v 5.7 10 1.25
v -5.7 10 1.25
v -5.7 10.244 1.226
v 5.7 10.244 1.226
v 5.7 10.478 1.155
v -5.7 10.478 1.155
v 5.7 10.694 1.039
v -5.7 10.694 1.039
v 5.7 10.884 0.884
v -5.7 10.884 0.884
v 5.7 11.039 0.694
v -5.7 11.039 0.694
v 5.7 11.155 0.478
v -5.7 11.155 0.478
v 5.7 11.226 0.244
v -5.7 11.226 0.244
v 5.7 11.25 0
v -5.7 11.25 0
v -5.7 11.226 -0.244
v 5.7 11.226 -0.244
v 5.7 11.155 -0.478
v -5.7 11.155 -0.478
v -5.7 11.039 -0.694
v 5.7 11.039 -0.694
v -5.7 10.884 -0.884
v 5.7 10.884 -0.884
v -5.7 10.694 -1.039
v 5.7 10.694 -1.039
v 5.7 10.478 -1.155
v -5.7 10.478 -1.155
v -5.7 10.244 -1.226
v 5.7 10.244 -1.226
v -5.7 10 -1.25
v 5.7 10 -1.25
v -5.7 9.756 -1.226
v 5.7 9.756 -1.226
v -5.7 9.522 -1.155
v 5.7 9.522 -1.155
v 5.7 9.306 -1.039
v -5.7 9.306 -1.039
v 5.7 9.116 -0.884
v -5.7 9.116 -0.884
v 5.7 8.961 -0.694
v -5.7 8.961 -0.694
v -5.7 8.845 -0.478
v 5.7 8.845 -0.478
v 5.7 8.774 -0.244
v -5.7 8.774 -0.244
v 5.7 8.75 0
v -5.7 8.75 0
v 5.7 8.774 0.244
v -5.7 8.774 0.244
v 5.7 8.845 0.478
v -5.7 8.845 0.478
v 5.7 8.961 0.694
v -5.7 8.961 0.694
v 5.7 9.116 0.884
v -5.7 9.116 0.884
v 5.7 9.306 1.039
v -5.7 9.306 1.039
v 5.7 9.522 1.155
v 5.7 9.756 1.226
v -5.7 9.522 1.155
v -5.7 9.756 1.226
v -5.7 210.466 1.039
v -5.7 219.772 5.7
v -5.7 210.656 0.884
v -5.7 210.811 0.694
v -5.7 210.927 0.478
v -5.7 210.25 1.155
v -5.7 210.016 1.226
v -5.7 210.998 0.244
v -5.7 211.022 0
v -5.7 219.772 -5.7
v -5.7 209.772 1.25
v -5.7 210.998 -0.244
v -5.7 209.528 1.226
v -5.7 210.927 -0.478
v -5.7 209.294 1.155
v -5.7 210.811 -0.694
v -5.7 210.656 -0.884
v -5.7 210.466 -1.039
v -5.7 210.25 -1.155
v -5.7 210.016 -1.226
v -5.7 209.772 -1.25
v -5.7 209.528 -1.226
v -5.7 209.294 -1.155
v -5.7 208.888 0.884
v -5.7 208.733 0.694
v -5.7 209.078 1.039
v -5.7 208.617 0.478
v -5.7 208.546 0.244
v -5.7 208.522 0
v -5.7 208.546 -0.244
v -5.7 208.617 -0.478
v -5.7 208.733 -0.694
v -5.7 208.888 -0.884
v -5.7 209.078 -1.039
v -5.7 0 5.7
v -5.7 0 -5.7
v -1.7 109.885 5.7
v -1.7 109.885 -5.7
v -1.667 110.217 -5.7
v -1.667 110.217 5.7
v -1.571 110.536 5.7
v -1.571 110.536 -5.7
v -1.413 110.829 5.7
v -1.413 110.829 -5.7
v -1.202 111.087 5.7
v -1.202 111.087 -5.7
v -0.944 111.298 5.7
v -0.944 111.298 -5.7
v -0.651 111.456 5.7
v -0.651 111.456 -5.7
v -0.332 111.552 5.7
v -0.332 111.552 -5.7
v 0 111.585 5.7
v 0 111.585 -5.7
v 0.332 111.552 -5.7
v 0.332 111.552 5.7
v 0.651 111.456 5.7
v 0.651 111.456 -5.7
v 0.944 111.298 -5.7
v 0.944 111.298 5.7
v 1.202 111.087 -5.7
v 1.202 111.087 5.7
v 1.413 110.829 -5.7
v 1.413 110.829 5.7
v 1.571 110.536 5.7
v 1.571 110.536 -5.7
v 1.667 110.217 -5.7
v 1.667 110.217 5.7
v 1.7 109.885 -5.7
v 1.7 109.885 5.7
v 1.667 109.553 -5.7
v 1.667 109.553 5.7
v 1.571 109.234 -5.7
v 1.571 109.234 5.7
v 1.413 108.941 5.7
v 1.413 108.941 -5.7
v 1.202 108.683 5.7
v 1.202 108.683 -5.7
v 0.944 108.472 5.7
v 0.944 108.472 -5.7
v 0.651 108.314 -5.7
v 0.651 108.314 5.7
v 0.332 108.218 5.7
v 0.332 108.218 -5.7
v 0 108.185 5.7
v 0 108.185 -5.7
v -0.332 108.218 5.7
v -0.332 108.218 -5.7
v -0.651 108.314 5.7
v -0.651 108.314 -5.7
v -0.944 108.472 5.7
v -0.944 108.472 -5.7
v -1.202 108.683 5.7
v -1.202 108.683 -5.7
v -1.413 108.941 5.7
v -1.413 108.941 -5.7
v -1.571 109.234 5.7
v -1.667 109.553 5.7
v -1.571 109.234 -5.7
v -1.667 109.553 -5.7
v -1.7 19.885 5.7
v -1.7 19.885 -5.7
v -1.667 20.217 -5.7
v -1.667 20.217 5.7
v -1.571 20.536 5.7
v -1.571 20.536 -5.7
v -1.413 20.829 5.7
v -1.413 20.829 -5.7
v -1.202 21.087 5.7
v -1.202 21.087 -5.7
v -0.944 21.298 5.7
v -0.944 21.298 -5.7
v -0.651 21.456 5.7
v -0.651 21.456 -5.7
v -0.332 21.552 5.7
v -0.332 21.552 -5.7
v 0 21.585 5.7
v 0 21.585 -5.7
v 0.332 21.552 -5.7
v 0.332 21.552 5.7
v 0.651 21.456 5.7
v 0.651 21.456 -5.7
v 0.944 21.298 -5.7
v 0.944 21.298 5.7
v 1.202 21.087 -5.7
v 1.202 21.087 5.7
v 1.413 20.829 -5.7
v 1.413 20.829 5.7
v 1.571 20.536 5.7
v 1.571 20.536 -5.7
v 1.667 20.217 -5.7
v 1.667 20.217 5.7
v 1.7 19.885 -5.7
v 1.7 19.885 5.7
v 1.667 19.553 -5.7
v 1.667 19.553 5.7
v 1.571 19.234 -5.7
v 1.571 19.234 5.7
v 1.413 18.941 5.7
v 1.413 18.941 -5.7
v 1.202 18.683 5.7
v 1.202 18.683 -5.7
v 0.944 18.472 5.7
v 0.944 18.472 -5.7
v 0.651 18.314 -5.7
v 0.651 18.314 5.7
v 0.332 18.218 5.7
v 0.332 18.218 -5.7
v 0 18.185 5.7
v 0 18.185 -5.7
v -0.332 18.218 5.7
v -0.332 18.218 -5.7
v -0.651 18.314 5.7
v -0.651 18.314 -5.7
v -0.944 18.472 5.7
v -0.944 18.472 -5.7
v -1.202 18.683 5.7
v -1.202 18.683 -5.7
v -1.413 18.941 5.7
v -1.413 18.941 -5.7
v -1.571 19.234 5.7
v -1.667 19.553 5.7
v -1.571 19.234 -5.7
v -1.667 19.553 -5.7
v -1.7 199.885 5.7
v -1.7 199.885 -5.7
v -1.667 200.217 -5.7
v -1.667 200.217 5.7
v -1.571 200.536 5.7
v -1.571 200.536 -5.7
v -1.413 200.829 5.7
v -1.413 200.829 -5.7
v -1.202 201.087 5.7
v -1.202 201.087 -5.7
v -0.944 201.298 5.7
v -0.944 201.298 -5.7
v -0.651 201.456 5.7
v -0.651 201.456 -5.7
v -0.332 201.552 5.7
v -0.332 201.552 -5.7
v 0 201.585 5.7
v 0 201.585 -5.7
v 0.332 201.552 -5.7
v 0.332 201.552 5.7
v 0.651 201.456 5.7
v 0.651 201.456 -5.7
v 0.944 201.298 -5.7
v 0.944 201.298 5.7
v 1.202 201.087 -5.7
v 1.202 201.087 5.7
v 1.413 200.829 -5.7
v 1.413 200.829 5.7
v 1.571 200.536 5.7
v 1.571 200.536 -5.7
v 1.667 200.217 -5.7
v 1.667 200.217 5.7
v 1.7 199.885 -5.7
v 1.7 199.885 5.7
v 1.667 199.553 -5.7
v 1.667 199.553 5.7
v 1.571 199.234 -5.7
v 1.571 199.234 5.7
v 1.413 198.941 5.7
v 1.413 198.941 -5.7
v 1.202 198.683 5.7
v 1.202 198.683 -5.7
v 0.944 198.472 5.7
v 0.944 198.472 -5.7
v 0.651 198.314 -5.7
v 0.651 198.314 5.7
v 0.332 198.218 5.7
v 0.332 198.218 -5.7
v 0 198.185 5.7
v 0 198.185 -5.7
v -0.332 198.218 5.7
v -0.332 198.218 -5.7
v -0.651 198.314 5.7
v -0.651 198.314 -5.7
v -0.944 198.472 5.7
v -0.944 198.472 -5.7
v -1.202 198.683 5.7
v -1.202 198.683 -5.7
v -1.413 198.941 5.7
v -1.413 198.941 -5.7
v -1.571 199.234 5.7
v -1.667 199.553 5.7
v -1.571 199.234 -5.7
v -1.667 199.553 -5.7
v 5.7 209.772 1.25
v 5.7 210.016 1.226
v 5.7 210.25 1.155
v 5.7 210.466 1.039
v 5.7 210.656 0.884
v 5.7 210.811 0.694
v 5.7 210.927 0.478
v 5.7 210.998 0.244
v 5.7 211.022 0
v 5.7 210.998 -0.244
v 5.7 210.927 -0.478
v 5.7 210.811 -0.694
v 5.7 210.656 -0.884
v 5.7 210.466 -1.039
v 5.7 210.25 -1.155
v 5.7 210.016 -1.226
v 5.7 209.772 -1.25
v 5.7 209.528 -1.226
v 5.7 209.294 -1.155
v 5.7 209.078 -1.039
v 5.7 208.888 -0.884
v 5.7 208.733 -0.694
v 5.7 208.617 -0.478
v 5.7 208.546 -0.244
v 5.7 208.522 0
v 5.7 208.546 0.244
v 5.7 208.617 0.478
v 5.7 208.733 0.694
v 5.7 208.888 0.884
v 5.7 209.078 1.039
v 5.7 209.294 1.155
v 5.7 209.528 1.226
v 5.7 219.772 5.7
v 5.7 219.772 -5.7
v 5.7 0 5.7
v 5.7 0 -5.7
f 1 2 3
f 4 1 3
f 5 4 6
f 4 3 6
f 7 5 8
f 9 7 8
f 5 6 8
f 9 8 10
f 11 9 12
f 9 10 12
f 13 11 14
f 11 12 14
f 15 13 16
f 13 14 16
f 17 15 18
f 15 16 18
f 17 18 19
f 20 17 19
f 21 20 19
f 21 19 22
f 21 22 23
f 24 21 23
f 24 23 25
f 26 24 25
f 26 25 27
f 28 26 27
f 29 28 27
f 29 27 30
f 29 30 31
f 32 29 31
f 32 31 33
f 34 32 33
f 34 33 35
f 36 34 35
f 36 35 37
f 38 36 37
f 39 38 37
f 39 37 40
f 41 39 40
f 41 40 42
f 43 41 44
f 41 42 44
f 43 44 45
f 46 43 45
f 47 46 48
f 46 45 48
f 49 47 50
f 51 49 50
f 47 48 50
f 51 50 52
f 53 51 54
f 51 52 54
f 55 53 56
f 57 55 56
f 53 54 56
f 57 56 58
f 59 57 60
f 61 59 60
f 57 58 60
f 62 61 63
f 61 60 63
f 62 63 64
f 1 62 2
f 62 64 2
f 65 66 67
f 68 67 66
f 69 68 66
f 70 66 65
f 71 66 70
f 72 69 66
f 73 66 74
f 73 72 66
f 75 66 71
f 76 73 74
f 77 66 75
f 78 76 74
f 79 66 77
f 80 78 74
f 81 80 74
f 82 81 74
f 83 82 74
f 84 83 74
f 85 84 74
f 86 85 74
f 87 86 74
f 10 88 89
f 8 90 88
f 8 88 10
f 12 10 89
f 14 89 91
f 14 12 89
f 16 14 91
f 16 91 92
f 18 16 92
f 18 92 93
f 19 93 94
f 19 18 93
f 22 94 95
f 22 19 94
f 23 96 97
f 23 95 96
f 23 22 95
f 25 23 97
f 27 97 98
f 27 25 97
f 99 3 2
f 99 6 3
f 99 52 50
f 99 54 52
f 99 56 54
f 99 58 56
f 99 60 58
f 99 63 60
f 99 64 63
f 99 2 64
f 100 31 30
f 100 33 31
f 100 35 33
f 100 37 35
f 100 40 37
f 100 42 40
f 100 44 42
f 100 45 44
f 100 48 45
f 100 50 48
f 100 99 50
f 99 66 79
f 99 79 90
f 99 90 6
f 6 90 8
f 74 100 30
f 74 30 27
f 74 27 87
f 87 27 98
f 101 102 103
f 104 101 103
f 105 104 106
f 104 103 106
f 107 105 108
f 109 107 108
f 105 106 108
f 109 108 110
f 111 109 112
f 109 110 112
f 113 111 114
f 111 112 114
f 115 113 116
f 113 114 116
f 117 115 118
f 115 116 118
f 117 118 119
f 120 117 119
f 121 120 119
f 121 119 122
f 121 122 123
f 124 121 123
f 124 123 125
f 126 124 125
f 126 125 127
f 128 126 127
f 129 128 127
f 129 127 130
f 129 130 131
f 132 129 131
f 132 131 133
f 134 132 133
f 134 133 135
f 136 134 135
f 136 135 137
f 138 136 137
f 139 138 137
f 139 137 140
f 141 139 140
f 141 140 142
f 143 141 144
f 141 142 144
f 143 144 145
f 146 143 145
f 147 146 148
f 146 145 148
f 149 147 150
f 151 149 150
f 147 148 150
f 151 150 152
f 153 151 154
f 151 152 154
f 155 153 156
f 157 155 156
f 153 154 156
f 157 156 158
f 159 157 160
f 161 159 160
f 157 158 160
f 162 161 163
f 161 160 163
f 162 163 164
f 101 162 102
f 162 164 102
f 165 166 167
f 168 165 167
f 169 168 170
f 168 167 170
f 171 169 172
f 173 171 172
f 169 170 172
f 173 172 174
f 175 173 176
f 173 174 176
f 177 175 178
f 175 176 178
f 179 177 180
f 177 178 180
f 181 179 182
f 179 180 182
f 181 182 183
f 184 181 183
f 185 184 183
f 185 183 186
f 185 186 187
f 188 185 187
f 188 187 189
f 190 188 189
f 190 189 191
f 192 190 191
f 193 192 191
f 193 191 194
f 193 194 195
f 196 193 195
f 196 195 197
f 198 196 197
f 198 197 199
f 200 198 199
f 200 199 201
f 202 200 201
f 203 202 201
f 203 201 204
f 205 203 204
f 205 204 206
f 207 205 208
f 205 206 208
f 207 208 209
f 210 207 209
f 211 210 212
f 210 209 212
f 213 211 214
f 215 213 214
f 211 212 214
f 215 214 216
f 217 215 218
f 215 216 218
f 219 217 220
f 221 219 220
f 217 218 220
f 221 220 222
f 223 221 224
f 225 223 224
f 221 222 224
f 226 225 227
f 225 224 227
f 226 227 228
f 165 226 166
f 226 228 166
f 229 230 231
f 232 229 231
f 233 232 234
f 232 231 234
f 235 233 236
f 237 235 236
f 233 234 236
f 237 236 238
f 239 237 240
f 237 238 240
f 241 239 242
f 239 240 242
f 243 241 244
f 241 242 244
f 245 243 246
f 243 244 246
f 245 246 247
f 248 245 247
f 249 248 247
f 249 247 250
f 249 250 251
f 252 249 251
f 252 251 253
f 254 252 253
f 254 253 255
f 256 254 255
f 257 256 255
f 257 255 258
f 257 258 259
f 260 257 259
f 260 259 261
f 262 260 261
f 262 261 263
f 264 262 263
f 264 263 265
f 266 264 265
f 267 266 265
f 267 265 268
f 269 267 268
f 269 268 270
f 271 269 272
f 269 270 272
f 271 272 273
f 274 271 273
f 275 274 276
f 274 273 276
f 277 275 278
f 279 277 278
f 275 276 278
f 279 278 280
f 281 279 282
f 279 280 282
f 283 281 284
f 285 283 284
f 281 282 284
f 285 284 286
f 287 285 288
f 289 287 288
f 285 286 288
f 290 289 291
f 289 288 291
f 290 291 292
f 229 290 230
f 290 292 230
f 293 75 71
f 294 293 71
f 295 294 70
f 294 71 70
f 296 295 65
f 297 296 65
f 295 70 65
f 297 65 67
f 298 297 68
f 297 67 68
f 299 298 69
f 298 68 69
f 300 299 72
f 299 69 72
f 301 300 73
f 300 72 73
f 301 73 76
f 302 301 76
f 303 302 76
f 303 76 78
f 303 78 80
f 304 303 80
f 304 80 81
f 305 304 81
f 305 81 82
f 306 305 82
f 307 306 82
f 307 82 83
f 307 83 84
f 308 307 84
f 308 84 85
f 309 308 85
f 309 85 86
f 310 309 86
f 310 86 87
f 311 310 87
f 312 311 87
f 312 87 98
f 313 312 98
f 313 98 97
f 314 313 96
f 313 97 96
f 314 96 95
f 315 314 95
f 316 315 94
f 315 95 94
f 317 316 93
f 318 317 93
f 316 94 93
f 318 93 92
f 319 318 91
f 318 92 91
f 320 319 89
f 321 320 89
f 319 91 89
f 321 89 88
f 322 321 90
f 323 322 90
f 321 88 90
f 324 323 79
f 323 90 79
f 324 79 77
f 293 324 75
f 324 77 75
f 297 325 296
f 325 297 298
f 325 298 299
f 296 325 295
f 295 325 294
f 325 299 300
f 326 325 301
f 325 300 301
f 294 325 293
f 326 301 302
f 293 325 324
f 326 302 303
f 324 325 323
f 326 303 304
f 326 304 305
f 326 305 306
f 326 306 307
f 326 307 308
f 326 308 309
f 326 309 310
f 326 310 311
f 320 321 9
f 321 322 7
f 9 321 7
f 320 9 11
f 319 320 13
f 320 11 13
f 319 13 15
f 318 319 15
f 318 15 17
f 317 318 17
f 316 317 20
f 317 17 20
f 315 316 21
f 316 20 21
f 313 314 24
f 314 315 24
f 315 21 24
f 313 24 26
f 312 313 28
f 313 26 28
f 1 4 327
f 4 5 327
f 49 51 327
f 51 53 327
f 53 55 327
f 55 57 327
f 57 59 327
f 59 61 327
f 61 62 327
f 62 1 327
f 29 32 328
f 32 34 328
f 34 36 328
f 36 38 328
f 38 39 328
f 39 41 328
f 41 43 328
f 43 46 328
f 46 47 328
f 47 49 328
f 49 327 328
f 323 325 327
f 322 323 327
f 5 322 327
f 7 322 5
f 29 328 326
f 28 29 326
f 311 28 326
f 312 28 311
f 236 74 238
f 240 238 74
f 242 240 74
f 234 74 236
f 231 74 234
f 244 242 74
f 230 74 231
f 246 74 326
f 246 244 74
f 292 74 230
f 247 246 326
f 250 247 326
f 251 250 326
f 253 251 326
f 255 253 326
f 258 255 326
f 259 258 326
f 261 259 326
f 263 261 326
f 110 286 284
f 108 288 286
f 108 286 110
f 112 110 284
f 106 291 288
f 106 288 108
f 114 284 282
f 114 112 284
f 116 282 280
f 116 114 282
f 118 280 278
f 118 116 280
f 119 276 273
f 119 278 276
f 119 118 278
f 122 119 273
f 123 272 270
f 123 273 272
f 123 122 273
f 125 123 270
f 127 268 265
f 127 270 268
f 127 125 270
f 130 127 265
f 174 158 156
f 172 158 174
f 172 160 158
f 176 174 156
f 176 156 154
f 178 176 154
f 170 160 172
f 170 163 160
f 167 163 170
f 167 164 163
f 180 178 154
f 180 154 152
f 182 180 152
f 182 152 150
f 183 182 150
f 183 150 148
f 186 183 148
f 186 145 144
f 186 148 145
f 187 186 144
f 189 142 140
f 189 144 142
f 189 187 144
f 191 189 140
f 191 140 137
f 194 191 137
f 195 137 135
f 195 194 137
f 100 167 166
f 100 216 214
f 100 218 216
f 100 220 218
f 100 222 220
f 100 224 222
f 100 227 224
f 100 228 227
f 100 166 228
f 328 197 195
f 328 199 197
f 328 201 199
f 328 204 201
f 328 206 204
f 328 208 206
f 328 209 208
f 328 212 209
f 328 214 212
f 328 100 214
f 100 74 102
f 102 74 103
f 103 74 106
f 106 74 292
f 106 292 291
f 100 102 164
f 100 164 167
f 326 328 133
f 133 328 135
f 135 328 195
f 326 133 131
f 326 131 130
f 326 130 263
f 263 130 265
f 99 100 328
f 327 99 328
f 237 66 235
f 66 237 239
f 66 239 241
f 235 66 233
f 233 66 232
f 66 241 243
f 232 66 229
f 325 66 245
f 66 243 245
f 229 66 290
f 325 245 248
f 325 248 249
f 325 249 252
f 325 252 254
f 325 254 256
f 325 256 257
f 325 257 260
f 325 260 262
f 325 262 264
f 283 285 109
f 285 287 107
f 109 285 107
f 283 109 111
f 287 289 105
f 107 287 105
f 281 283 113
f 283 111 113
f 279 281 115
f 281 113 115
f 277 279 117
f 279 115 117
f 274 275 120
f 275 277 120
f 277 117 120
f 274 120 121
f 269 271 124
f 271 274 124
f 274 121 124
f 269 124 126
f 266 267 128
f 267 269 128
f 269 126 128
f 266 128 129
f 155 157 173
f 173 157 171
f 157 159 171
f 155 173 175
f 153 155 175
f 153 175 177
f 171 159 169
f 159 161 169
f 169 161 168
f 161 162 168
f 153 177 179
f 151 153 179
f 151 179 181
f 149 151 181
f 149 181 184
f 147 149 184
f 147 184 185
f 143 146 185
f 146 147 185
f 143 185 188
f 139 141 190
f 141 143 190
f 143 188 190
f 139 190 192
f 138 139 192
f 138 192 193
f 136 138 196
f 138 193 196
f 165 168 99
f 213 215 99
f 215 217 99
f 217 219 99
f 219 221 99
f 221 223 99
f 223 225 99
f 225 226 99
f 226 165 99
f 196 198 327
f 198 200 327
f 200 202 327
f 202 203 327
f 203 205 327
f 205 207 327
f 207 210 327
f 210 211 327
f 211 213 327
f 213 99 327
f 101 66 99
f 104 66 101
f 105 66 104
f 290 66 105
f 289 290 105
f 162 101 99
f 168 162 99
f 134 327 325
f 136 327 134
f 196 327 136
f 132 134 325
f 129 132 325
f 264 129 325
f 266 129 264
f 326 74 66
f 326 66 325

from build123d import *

# Parameters (mm, degrees)
ESQUISSE1_W        = 11.4
ESQUISSE1_H        = 11.4
BOSS_EXTRU_1_DEPTH = 219.772
D_GAGEMENT_M31_D   = 3.4
TROU_TARAUD_M31_D  = 2.5


with BuildPart() as part:
    # Esquisse1 → Boss.-Extru.1 (new body)
    with BuildSketch(Plane(origin=(0, 0, 0), x_dir=(1, 0, 0), z_dir=(0, 1, 0))):
        Rectangle(ESQUISSE1_W, ESQUISSE1_H)
    extrude(amount=BOSS_EXTRU_1_DEPTH)

    # Dégagement M31 (through all)
    with Locations(Plane.XY.offset(5.7)):
        with Locations((0, 199.885), (0, 109.885), (0, 19.885)):
            Hole(D_GAGEMENT_M31_D / 2)

    # Trou taraudé M31 (through all)
    with Locations(Plane(origin=(5.7, 0, 0), x_dir=(0, 0, -1), z_dir=(1, 0, 0))):
        with Locations((0, 209.772), (0, 10)):
            Hole(TROU_TARAUD_M31_D / 2)


solid = part.part
